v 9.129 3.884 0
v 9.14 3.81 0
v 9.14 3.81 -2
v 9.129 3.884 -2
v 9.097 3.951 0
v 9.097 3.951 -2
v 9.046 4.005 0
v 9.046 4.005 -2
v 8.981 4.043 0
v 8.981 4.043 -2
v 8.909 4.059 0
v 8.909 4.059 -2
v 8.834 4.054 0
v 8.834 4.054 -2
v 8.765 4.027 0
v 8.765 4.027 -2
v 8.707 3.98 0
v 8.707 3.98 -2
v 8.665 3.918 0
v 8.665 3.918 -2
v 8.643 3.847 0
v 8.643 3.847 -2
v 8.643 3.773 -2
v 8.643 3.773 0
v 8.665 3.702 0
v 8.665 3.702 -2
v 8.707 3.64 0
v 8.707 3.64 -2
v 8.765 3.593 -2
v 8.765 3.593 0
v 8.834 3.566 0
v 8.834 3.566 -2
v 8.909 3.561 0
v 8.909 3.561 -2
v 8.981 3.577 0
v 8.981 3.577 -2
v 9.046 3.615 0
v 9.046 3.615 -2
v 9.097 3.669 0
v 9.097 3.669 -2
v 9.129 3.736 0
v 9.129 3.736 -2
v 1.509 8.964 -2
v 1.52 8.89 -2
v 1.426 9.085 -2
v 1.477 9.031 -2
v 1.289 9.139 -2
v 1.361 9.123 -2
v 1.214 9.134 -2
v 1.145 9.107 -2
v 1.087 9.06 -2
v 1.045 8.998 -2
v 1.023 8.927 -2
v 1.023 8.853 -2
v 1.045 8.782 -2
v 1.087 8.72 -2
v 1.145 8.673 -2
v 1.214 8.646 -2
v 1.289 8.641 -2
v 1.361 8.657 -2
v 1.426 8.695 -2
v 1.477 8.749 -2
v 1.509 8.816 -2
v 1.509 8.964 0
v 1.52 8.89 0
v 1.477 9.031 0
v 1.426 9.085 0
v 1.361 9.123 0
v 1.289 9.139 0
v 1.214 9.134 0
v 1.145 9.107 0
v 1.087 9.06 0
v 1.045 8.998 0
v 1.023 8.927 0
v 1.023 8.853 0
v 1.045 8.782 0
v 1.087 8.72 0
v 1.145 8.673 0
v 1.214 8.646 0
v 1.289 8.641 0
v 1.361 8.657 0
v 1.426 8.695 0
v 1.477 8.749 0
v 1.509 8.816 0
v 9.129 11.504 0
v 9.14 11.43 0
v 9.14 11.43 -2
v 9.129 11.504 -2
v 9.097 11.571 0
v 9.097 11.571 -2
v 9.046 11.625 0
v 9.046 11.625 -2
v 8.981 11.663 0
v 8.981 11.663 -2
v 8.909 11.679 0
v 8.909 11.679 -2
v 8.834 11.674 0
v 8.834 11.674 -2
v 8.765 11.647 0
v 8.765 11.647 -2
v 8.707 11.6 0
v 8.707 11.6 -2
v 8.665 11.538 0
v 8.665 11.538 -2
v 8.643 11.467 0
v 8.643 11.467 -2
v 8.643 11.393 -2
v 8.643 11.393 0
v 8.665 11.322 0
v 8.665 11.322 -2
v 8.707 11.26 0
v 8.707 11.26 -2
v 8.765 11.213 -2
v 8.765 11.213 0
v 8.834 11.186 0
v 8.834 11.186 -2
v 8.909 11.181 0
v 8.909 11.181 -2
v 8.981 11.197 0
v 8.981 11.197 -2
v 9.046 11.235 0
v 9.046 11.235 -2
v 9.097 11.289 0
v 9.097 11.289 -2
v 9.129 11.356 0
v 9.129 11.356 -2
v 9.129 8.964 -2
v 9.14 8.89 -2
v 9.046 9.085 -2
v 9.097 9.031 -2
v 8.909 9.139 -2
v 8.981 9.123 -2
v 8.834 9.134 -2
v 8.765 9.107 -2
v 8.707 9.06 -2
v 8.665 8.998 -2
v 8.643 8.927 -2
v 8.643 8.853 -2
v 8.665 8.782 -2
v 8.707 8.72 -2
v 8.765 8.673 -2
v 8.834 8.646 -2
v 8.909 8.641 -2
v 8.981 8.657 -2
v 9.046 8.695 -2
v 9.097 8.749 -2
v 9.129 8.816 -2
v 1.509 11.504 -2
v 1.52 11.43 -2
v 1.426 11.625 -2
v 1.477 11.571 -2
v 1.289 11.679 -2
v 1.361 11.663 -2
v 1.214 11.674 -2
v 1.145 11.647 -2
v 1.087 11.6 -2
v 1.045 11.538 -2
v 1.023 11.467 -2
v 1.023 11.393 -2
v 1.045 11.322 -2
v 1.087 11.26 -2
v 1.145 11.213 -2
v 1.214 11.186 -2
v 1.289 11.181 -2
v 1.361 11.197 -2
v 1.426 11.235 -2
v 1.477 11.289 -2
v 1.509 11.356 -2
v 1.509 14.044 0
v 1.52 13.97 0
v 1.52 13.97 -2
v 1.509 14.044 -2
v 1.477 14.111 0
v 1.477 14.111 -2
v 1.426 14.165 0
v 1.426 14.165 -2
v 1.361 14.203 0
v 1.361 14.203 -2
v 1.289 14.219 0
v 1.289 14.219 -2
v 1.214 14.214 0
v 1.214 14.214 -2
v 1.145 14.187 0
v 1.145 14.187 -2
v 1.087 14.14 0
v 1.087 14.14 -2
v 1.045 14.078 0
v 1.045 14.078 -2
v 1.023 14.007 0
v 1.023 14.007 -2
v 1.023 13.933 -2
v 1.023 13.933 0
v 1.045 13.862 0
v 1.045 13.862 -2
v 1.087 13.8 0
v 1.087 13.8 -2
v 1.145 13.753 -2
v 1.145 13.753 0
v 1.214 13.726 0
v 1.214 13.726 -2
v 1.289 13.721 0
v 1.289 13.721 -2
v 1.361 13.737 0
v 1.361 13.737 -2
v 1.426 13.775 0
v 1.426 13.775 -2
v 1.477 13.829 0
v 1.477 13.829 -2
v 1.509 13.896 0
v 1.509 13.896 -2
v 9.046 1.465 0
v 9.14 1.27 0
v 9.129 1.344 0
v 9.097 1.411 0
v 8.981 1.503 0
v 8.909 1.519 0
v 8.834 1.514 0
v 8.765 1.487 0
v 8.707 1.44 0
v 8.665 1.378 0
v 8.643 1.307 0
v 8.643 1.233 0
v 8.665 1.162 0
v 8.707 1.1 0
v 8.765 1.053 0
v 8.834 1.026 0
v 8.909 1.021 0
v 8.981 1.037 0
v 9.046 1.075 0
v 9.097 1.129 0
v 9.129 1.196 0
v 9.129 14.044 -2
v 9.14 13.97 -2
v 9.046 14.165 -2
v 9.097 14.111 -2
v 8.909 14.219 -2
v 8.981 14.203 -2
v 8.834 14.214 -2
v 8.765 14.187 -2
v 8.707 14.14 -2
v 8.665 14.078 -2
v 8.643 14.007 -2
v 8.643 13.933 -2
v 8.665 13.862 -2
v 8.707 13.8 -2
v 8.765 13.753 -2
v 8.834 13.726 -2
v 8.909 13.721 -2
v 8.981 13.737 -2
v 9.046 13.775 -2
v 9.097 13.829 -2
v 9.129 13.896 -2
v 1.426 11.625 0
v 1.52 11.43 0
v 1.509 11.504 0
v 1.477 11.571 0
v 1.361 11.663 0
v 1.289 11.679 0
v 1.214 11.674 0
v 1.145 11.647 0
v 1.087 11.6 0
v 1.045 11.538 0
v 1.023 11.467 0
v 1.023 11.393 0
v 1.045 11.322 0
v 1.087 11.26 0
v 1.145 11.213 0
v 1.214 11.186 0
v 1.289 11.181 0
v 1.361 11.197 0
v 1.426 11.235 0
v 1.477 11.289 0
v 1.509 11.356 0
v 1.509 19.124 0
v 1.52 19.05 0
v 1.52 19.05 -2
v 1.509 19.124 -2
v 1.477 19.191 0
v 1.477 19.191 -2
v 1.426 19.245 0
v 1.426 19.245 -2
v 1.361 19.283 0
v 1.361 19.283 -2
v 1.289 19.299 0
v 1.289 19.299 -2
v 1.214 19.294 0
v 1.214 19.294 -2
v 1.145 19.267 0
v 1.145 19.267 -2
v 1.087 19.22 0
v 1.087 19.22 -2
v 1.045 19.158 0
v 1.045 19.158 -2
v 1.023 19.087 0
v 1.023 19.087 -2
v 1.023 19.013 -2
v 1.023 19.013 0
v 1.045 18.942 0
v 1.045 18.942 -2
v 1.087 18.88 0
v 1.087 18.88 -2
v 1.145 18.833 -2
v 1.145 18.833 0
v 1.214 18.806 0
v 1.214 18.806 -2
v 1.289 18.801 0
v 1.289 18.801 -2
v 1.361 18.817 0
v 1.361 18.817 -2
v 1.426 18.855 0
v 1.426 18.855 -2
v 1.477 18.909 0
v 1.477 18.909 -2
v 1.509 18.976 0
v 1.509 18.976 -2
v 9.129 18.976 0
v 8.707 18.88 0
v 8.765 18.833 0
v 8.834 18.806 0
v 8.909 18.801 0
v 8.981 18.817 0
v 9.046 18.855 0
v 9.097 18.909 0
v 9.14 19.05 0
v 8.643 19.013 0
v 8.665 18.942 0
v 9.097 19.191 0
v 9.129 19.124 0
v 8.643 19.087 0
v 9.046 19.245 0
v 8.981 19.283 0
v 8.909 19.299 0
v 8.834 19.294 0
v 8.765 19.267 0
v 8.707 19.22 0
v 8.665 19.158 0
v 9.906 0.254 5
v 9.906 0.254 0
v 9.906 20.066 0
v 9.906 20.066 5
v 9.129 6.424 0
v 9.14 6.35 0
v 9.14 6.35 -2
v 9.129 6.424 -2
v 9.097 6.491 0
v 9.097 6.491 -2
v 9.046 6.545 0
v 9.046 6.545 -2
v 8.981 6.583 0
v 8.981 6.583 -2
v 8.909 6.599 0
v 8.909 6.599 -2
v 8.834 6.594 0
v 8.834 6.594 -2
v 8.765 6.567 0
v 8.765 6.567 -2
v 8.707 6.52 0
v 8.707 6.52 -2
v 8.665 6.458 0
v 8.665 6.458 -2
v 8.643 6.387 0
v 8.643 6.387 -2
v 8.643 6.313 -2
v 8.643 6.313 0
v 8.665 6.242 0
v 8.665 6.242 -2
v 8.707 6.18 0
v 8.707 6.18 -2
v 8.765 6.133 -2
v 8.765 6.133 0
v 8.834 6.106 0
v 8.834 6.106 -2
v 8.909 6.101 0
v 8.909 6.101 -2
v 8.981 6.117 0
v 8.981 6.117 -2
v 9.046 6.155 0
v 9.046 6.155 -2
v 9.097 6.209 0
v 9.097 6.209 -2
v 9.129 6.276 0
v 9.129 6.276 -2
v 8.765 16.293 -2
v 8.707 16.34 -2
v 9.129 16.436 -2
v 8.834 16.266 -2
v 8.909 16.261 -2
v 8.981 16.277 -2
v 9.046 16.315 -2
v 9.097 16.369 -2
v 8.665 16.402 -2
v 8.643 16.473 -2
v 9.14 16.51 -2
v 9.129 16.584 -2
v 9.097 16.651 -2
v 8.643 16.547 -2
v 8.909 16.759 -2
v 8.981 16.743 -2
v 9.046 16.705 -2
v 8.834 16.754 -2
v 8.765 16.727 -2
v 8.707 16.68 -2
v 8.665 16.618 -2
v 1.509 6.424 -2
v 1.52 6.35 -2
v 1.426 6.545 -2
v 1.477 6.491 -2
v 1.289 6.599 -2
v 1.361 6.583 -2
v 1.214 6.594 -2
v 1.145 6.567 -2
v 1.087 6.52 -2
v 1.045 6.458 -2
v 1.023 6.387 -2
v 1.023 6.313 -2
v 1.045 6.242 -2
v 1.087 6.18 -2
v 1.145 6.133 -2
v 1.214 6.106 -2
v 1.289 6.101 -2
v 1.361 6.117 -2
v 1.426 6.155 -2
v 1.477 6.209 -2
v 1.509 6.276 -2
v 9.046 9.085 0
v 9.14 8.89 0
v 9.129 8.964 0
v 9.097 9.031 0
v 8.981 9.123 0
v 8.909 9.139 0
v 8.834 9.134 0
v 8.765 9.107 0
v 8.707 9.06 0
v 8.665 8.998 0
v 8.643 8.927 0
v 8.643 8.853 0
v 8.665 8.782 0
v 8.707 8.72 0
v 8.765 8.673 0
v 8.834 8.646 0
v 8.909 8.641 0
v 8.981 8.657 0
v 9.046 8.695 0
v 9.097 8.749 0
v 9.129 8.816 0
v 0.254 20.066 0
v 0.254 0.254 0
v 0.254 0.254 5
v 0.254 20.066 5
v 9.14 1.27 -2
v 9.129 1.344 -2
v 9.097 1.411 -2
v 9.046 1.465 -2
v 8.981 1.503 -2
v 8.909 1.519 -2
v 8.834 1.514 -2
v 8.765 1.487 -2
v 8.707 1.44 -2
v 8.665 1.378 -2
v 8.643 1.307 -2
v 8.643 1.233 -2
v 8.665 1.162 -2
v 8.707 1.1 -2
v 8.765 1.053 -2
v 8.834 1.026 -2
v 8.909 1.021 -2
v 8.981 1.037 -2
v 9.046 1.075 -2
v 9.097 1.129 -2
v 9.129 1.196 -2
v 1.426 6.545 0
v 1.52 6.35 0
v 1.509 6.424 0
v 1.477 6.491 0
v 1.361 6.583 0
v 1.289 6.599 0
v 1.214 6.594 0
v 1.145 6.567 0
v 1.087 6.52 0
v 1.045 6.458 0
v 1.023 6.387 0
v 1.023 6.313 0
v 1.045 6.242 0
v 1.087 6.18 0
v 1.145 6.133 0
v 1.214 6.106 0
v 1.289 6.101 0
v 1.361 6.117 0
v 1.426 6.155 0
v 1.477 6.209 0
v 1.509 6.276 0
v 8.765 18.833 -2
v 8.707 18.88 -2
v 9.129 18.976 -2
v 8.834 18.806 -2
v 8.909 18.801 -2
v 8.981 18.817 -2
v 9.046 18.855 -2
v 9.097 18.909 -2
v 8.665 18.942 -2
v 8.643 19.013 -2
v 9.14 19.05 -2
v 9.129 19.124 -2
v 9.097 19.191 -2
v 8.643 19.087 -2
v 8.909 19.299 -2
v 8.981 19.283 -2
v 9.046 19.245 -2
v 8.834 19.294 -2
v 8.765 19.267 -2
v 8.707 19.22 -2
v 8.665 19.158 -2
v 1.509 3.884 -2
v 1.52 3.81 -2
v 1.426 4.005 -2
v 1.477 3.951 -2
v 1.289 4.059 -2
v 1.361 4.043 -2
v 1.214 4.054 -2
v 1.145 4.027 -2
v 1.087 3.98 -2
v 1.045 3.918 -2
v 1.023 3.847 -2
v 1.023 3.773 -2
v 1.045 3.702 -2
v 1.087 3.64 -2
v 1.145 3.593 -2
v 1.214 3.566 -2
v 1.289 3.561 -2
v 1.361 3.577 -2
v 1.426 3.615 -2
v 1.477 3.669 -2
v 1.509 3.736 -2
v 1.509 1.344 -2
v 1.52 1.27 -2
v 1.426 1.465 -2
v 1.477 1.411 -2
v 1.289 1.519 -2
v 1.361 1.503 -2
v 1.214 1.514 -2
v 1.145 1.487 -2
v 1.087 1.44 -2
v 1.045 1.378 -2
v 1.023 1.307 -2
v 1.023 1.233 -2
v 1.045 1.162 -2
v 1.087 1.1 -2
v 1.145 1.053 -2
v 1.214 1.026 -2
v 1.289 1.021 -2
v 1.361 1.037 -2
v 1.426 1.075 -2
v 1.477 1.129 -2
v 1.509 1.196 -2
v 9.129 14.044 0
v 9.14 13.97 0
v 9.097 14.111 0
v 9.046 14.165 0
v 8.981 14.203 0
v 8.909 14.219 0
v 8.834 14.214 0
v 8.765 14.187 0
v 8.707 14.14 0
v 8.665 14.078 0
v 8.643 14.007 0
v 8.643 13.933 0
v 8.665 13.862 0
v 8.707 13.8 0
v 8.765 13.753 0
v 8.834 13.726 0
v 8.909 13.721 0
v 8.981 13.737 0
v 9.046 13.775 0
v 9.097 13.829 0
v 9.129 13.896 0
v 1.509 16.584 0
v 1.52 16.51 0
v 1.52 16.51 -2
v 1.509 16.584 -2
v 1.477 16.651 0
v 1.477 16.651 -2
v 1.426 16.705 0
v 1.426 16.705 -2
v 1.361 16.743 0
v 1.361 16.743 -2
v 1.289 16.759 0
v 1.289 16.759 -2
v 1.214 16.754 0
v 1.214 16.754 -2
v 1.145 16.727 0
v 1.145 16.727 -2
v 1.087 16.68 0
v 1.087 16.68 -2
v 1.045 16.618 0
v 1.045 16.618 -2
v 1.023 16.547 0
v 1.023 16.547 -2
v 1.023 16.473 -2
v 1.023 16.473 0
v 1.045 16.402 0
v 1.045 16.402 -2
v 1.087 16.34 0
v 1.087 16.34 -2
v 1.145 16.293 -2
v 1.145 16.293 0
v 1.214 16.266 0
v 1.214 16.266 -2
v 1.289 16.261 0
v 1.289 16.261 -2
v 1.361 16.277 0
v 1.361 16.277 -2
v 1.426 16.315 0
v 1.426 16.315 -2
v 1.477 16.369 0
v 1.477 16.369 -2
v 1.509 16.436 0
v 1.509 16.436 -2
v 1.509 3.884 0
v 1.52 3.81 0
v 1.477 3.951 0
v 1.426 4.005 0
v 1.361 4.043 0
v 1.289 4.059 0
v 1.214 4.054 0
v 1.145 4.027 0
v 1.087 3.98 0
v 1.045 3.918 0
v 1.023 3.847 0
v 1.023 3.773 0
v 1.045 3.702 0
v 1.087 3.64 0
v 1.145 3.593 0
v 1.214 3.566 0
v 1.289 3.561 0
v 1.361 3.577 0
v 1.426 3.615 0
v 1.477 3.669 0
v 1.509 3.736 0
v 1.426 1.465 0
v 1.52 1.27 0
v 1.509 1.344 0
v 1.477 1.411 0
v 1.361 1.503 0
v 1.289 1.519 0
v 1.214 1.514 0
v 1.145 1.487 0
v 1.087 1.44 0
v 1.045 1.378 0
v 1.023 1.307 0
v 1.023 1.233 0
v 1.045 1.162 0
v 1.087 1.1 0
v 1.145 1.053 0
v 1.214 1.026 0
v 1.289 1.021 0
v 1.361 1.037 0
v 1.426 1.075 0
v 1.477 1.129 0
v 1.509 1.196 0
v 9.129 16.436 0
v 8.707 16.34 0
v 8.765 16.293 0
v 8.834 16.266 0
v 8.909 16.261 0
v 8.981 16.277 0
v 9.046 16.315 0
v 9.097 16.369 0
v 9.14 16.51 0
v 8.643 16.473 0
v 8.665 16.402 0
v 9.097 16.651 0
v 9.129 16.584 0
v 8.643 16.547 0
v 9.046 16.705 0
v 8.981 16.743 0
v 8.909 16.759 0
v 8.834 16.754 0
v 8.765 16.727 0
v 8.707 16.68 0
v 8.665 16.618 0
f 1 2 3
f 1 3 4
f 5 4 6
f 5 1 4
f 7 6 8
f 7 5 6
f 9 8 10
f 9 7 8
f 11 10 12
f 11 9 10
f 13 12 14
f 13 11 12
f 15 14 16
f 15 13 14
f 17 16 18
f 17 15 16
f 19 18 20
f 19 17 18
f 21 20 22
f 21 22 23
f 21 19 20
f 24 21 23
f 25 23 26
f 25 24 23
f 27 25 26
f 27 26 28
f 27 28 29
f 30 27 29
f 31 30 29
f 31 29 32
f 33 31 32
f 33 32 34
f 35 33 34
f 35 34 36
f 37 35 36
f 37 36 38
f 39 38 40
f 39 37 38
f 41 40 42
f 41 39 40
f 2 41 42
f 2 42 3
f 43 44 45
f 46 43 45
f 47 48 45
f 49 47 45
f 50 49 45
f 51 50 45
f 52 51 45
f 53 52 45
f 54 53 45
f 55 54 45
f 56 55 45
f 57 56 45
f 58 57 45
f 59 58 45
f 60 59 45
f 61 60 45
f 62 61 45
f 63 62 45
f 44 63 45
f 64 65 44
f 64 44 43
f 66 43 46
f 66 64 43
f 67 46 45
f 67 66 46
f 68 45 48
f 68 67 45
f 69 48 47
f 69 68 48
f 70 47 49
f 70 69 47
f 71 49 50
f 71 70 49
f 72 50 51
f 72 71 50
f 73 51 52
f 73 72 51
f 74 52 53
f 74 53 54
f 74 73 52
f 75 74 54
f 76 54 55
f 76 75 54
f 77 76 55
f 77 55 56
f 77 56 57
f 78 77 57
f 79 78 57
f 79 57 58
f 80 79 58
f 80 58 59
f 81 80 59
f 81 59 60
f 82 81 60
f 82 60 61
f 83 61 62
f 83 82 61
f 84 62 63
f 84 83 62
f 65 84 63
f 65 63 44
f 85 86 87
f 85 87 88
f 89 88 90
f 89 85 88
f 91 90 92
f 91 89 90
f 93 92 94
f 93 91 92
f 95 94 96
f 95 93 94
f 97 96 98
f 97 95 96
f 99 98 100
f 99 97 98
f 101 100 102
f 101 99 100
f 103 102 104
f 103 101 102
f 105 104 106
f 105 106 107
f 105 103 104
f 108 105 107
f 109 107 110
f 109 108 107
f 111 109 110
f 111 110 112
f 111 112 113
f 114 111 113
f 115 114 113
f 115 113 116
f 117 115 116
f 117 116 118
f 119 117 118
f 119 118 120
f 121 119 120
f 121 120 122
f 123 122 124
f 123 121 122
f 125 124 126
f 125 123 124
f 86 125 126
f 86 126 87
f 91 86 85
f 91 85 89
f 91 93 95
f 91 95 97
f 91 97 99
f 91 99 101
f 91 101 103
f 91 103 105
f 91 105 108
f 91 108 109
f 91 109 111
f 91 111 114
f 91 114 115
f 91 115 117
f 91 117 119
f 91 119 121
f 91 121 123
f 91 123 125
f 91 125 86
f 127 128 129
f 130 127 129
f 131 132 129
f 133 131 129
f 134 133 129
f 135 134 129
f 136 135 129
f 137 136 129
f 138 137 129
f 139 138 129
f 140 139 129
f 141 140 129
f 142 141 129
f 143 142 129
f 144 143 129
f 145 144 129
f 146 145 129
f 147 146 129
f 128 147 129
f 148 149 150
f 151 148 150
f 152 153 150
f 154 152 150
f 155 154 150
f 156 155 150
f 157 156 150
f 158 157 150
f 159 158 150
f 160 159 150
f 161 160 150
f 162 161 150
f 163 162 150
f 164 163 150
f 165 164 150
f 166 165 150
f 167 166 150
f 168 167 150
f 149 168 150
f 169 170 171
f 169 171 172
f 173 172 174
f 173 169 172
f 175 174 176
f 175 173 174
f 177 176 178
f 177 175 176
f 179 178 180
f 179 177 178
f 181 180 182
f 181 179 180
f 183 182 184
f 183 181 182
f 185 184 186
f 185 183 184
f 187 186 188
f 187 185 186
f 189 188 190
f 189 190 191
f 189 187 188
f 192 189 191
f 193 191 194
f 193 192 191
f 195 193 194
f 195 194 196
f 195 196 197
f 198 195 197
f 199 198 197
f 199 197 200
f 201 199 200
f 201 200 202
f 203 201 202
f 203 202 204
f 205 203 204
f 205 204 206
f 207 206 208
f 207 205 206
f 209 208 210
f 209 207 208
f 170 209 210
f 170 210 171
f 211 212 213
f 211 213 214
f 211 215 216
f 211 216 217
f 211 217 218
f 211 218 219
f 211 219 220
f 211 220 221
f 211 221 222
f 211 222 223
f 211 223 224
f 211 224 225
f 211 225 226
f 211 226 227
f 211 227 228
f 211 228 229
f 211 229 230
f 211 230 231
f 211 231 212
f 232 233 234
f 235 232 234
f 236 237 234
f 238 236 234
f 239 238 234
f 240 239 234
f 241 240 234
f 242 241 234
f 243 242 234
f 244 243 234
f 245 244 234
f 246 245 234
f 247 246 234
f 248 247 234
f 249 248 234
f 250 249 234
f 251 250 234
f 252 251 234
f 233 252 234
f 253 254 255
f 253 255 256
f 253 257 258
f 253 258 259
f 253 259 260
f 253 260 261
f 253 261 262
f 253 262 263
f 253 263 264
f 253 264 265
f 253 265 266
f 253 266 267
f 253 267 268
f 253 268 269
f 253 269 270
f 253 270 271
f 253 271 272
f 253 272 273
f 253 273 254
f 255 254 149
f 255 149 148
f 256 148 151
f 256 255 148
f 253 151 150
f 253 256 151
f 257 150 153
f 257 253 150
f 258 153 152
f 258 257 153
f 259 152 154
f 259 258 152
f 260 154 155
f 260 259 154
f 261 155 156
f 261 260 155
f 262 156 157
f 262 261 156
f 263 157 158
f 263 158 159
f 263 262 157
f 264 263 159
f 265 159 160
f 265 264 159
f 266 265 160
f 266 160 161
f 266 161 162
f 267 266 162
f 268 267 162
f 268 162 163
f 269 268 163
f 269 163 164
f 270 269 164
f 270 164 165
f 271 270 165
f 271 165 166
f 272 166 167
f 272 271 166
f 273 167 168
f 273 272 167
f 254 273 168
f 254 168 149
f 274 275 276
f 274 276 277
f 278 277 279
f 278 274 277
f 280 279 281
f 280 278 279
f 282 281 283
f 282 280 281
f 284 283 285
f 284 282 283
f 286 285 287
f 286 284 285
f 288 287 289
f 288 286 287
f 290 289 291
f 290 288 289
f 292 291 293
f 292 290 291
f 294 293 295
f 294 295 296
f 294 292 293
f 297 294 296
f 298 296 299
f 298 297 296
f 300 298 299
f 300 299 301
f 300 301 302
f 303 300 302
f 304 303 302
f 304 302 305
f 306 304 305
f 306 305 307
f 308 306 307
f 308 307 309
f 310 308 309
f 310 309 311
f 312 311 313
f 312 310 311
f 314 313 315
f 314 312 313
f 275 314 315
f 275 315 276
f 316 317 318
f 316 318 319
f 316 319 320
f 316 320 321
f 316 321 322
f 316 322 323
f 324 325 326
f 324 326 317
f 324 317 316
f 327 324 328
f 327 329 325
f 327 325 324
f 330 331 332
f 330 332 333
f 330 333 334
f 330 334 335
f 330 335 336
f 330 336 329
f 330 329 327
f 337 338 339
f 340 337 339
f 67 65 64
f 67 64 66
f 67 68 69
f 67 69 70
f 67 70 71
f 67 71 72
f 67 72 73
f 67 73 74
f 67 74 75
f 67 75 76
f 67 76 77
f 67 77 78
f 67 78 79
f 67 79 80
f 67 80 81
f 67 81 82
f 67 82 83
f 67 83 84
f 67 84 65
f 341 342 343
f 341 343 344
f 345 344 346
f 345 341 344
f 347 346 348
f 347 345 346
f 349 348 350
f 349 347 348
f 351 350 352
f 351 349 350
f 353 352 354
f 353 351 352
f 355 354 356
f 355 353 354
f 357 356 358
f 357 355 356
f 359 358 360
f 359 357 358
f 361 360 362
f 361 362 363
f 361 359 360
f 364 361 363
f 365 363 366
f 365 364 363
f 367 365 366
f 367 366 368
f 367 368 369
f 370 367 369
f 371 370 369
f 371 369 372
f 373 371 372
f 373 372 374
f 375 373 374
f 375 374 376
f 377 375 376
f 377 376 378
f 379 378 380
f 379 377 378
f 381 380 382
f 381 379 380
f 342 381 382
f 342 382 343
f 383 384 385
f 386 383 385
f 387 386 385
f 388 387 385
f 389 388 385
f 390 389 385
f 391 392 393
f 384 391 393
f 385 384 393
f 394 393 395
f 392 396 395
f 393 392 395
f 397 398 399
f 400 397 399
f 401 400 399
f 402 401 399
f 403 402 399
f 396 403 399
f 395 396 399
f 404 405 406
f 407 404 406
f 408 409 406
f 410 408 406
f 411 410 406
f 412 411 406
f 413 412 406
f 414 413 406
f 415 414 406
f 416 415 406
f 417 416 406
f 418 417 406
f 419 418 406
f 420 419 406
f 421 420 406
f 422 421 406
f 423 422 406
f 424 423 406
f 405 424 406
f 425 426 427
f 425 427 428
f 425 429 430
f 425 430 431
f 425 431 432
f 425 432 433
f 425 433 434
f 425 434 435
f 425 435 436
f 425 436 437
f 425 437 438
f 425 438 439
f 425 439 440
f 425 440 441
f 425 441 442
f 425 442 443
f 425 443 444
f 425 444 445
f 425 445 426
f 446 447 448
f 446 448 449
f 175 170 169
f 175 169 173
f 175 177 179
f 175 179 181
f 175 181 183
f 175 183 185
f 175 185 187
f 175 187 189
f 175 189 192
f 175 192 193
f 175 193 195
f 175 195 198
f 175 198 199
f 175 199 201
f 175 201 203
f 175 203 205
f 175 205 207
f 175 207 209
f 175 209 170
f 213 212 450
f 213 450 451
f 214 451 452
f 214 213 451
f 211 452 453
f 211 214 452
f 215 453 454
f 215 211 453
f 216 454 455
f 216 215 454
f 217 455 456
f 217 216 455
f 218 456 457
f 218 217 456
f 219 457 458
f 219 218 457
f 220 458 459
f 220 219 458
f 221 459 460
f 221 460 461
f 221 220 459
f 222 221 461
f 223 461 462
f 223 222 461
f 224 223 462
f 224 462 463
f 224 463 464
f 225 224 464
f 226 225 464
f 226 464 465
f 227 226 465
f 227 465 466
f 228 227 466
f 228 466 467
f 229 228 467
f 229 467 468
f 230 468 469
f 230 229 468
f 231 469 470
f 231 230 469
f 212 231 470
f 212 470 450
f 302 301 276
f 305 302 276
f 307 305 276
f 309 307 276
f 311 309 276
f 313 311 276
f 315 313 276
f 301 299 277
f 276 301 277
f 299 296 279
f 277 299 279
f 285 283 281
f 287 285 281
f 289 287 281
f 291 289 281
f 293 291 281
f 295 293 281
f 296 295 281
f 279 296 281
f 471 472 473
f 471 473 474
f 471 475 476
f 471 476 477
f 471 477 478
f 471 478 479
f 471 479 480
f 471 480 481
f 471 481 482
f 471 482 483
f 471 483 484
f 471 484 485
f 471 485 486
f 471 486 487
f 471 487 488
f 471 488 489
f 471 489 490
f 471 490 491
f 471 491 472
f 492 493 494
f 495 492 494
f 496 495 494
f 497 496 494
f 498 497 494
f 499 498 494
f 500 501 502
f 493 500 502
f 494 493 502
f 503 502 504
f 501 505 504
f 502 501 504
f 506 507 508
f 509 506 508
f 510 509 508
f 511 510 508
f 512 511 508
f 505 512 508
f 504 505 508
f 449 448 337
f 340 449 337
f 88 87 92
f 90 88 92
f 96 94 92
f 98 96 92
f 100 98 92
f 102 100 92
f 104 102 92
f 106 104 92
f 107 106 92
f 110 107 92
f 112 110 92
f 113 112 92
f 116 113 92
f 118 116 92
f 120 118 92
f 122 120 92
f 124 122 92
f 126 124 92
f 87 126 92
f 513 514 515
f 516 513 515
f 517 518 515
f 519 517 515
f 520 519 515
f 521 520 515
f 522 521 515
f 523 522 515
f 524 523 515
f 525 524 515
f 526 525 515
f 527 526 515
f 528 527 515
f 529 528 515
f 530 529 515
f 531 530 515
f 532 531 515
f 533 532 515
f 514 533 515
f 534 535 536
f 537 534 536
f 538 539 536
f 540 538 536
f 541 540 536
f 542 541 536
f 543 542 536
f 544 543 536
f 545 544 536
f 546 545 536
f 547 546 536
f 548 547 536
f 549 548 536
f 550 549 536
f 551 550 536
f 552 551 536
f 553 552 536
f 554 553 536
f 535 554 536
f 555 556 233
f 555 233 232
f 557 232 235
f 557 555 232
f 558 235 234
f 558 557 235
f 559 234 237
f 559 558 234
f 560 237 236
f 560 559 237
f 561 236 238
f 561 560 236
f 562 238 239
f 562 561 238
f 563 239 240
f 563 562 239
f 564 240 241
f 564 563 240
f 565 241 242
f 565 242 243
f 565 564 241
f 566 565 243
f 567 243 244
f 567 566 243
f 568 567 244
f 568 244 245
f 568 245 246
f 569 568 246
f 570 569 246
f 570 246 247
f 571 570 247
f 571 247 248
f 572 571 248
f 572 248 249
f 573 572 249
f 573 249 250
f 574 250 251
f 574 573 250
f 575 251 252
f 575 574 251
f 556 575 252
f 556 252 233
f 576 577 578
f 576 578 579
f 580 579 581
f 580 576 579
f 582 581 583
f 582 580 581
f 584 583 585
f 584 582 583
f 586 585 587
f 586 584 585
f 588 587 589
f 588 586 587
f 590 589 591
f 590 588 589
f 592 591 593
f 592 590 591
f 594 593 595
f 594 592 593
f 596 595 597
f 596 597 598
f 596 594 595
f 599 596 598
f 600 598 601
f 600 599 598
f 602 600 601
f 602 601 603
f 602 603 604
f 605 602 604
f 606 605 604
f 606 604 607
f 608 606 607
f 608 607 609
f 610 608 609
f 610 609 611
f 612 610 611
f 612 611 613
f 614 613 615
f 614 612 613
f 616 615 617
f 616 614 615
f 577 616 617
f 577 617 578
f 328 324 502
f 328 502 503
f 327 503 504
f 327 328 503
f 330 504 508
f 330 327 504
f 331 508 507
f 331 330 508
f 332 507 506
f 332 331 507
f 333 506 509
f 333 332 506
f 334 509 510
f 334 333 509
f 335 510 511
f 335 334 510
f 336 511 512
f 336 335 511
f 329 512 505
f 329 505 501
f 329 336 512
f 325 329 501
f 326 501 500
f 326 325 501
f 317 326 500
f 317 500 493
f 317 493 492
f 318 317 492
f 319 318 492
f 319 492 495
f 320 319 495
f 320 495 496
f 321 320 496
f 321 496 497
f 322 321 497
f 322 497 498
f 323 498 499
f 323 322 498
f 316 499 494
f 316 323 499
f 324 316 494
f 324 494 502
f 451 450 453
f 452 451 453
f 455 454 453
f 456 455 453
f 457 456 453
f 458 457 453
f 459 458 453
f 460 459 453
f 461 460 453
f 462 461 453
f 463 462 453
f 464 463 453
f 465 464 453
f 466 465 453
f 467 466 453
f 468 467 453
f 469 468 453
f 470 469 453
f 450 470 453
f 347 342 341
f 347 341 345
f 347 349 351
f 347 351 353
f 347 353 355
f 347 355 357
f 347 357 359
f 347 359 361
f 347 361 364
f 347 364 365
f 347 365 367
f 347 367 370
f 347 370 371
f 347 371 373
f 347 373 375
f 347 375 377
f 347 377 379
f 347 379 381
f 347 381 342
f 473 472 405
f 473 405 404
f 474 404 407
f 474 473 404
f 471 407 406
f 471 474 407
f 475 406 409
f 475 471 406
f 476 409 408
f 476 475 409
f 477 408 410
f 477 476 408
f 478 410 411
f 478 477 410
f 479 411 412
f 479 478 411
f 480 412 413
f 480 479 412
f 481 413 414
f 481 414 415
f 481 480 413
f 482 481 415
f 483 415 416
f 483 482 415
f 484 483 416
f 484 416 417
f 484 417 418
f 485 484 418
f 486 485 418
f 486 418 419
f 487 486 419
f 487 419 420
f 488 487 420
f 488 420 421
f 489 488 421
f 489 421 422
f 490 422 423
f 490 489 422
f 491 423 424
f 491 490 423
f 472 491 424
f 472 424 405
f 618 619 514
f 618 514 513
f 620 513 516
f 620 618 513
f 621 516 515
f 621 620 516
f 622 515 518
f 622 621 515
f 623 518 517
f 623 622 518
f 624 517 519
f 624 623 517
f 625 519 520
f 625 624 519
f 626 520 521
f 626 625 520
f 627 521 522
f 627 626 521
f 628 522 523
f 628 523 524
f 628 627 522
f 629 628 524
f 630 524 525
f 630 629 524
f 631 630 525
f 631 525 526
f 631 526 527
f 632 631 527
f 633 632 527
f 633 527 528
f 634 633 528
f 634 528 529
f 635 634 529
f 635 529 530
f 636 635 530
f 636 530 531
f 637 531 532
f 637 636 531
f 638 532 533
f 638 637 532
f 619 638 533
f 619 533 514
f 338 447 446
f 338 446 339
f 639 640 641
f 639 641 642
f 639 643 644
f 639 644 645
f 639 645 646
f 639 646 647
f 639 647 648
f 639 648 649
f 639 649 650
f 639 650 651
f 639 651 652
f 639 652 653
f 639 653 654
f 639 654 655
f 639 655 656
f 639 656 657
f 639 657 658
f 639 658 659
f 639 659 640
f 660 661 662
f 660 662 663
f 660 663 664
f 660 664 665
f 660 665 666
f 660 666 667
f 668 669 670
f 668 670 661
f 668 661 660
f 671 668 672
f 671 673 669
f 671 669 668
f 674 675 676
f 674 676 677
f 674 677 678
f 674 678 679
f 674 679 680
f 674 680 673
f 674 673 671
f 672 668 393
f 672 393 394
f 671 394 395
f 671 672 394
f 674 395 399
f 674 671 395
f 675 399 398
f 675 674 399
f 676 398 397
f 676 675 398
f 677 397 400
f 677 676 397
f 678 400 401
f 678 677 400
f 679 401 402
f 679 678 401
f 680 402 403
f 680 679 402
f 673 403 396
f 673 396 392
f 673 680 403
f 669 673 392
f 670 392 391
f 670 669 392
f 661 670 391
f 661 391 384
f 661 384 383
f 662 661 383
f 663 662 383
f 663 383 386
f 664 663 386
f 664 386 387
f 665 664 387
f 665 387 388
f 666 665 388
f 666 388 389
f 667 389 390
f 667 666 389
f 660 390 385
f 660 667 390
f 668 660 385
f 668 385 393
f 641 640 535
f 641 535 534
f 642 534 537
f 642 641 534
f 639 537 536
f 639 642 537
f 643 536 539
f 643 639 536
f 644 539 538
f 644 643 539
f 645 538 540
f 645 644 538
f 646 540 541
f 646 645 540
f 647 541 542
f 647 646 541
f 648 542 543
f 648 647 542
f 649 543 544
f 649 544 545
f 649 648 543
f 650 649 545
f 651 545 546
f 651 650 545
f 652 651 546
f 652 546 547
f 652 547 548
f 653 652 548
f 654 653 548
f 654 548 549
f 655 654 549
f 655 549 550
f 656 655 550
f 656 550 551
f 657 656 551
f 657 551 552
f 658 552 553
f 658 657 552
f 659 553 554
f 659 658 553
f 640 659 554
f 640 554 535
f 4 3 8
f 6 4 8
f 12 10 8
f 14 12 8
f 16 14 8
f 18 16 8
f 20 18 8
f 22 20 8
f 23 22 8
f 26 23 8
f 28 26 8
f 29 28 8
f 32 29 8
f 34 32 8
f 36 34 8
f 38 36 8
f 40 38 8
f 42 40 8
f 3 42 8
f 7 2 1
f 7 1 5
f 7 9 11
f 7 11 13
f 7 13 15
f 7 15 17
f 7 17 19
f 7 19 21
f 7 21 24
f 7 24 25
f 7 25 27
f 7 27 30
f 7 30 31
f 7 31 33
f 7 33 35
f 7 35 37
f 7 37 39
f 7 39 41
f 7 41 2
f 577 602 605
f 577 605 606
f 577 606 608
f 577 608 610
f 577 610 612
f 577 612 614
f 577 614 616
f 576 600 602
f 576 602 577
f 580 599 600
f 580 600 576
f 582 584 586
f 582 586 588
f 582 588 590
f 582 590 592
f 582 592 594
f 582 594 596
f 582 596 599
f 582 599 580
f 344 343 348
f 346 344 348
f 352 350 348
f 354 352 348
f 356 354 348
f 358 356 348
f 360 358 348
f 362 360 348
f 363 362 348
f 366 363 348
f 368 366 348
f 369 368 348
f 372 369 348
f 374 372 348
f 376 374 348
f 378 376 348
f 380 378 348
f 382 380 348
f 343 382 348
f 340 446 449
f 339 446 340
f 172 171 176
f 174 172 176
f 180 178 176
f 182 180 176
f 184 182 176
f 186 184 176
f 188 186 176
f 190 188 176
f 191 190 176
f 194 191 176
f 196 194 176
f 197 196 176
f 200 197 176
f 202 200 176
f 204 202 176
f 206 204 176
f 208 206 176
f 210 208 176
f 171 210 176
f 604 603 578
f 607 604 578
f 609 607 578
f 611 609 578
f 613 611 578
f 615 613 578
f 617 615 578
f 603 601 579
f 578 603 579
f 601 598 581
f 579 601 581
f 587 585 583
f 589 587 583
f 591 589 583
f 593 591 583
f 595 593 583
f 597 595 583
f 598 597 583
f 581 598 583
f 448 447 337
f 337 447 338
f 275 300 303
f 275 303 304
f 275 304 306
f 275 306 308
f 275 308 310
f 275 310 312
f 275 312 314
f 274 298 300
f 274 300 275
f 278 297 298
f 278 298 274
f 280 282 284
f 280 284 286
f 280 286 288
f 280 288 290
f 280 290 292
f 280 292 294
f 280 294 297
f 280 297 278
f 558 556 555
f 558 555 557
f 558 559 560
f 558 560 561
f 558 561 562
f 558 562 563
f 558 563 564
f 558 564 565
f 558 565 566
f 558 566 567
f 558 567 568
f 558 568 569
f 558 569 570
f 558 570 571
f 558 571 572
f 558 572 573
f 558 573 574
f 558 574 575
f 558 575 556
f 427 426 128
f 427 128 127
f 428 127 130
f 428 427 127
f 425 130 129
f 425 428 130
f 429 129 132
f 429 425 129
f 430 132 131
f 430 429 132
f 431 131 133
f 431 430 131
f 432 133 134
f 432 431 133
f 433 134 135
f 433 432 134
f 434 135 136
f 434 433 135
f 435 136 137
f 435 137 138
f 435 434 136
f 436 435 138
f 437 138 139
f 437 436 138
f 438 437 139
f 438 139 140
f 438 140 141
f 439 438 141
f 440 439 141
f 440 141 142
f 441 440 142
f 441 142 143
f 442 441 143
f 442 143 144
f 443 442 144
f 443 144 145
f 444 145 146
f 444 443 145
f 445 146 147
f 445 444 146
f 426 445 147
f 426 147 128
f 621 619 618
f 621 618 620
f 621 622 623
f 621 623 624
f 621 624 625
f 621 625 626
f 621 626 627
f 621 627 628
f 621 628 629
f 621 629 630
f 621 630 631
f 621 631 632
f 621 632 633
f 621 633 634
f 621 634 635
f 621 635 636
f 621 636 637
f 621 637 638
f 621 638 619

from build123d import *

# Parameters (mm, degrees)
SKETCH1_W               = 9.652
SKETCH1_H               = 19.812
COMPONENT_OUTLINE_DEPTH = 5
SKETCH2_R               = 0.25
EXTRUDE_1_DEPTH         = 2
SKETCH3_R               = 0.25
EXTRUDE_2_DEPTH         = 2
SKETCH4_R               = 0.25
EXTRUDE_3_DEPTH         = 2
SKETCH5_R               = 0.25
EXTRUDE_4_DEPTH         = 2
SKETCH6_R               = 0.25
EXTRUDE_5_DEPTH         = 2
SKETCH7_R               = 0.25
EXTRUDE_6_DEPTH         = 2
SKETCH8_R               = 0.25
EXTRUDE_7_DEPTH         = 2
SKETCH9_R               = 0.25
EXTRUDE_8_DEPTH         = 2
SKETCH10_R              = 0.25
EXTRUDE_9_DEPTH         = 2
SKETCH11_R              = 0.25
EXTRUDE_10_DEPTH        = 2
SKETCH12_R              = 0.25
EXTRUDE_11_DEPTH        = 2
SKETCH13_R              = 0.25
EXTRUDE_12_DEPTH        = 2
SKETCH14_R              = 0.25
EXTRUDE_13_DEPTH        = 2
SKETCH15_R              = 0.25
EXTRUDE_14_DEPTH        = 2
SKETCH16_R              = 0.25
EXTRUDE_15_DEPTH        = 2
SKETCH17_R              = 0.25
EXTRUDE_16_DEPTH        = 2


with BuildPart() as part:
    # Sketch1 → Component_Outline (new body)
    with BuildSketch(Plane.XY):
        with Locations((5.08, 10.16)):
            Rectangle(SKETCH1_W, SKETCH1_H)
    extrude(amount=COMPONENT_OUTLINE_DEPTH)


with BuildPart() as body_2:
    # Sketch2 → Extrude 1 (new body)
    with BuildSketch(Plane.XY):
        with Locations((1.27, 1.27)):
            Circle(SKETCH2_R)
    extrude(amount=-EXTRUDE_1_DEPTH)


with BuildPart() as body_3:
    # Sketch3 → Extrude 2 (new body)
    with BuildSketch(Plane.XY):
        with Locations((1.27, 3.81)):
            Circle(SKETCH3_R)
    extrude(amount=-EXTRUDE_2_DEPTH)


with BuildPart() as body_4:
    # Sketch4 → Extrude 3 (new body)
    with BuildSketch(Plane.XY):
        with Locations((1.27, 6.35)):
            Circle(SKETCH4_R)
    extrude(amount=-EXTRUDE_3_DEPTH)


with BuildPart() as body_5:
    # Sketch5 → Extrude 4 (new body)
    with BuildSketch(Plane.XY):
        with Locations((1.27, 8.89)):
            Circle(SKETCH5_R)
    extrude(amount=-EXTRUDE_4_DEPTH)


with BuildPart() as body_6:
    # Sketch6 → Extrude 5 (new body)
    with BuildSketch(Plane.XY):
        with Locations((1.27, 11.43)):
            Circle(SKETCH6_R)
    extrude(amount=-EXTRUDE_5_DEPTH)


with BuildPart() as body_7:
    # Sketch7 → Extrude 6 (new body)
    with BuildSketch(Plane.XY):
        with Locations((1.27, 13.97)):
            Circle(SKETCH7_R)
    extrude(amount=-EXTRUDE_6_DEPTH)


with BuildPart() as body_8:
    # Sketch8 → Extrude 7 (new body)
    with BuildSketch(Plane.XY):
        with Locations((1.27, 16.51)):
            Circle(SKETCH8_R)
    extrude(amount=-EXTRUDE_7_DEPTH)


with BuildPart() as body_9:
    # Sketch9 → Extrude 8 (new body)
    with BuildSketch(Plane.XY):
        with Locations((1.27, 19.05)):
            Circle(SKETCH9_R)
    extrude(amount=-EXTRUDE_8_DEPTH)


with BuildPart() as body_10:
    # Sketch10 → Extrude 9 (new body)
    with BuildSketch(Plane.XY):
        with Locations((8.89, 1.27)):
            Circle(SKETCH10_R)
    extrude(amount=-EXTRUDE_9_DEPTH)


with BuildPart() as body_11:
    # Sketch11 → Extrude 10 (new body)
    with BuildSketch(Plane.XY):
        with Locations((8.89, 3.81)):
            Circle(SKETCH11_R)
    extrude(amount=-EXTRUDE_10_DEPTH)


with BuildPart() as body_12:
    # Sketch12 → Extrude 11 (new body)
    with BuildSketch(Plane.XY):
        with Locations((8.89, 6.35)):
            Circle(SKETCH12_R)
    extrude(amount=-EXTRUDE_11_DEPTH)


with BuildPart() as body_13:
    # Sketch13 → Extrude 12 (new body)
    with BuildSketch(Plane.XY):
        with Locations((8.89, 8.89)):
            Circle(SKETCH13_R)
    extrude(amount=-EXTRUDE_12_DEPTH)


with BuildPart() as body_14:
    # Sketch14 → Extrude 13 (new body)
    with BuildSketch(Plane.XY):
        with Locations((8.89, 11.43)):
            Circle(SKETCH14_R)
    extrude(amount=-EXTRUDE_13_DEPTH)


with BuildPart() as body_15:
    # Sketch15 → Extrude 14 (new body)
    with BuildSketch(Plane.XY):
        with Locations((8.89, 13.97)):
            Circle(SKETCH15_R)
    extrude(amount=-EXTRUDE_14_DEPTH)


with BuildPart() as body_16:
    # Sketch16 → Extrude 15 (new body)
    with BuildSketch(Plane.XY):
        with Locations((8.89, 16.51)):
            Circle(SKETCH16_R)
    extrude(amount=-EXTRUDE_15_DEPTH)


with BuildPart() as body_17:
    # Sketch17 → Extrude 16 (new body)
    with BuildSketch(Plane.XY):
        with Locations((8.89, 19.05)):
            Circle(SKETCH17_R)
    extrude(amount=-EXTRUDE_16_DEPTH)


solid = Compound([part.part, body_2.part, body_3.part, body_4.part, body_5.part, body_6.part, body_7.part, body_8.part, body_9.part, body_10.part, body_11.part, body_12.part, body_13.part, body_14.part, body_15.part, body_16.part, body_17.part])
